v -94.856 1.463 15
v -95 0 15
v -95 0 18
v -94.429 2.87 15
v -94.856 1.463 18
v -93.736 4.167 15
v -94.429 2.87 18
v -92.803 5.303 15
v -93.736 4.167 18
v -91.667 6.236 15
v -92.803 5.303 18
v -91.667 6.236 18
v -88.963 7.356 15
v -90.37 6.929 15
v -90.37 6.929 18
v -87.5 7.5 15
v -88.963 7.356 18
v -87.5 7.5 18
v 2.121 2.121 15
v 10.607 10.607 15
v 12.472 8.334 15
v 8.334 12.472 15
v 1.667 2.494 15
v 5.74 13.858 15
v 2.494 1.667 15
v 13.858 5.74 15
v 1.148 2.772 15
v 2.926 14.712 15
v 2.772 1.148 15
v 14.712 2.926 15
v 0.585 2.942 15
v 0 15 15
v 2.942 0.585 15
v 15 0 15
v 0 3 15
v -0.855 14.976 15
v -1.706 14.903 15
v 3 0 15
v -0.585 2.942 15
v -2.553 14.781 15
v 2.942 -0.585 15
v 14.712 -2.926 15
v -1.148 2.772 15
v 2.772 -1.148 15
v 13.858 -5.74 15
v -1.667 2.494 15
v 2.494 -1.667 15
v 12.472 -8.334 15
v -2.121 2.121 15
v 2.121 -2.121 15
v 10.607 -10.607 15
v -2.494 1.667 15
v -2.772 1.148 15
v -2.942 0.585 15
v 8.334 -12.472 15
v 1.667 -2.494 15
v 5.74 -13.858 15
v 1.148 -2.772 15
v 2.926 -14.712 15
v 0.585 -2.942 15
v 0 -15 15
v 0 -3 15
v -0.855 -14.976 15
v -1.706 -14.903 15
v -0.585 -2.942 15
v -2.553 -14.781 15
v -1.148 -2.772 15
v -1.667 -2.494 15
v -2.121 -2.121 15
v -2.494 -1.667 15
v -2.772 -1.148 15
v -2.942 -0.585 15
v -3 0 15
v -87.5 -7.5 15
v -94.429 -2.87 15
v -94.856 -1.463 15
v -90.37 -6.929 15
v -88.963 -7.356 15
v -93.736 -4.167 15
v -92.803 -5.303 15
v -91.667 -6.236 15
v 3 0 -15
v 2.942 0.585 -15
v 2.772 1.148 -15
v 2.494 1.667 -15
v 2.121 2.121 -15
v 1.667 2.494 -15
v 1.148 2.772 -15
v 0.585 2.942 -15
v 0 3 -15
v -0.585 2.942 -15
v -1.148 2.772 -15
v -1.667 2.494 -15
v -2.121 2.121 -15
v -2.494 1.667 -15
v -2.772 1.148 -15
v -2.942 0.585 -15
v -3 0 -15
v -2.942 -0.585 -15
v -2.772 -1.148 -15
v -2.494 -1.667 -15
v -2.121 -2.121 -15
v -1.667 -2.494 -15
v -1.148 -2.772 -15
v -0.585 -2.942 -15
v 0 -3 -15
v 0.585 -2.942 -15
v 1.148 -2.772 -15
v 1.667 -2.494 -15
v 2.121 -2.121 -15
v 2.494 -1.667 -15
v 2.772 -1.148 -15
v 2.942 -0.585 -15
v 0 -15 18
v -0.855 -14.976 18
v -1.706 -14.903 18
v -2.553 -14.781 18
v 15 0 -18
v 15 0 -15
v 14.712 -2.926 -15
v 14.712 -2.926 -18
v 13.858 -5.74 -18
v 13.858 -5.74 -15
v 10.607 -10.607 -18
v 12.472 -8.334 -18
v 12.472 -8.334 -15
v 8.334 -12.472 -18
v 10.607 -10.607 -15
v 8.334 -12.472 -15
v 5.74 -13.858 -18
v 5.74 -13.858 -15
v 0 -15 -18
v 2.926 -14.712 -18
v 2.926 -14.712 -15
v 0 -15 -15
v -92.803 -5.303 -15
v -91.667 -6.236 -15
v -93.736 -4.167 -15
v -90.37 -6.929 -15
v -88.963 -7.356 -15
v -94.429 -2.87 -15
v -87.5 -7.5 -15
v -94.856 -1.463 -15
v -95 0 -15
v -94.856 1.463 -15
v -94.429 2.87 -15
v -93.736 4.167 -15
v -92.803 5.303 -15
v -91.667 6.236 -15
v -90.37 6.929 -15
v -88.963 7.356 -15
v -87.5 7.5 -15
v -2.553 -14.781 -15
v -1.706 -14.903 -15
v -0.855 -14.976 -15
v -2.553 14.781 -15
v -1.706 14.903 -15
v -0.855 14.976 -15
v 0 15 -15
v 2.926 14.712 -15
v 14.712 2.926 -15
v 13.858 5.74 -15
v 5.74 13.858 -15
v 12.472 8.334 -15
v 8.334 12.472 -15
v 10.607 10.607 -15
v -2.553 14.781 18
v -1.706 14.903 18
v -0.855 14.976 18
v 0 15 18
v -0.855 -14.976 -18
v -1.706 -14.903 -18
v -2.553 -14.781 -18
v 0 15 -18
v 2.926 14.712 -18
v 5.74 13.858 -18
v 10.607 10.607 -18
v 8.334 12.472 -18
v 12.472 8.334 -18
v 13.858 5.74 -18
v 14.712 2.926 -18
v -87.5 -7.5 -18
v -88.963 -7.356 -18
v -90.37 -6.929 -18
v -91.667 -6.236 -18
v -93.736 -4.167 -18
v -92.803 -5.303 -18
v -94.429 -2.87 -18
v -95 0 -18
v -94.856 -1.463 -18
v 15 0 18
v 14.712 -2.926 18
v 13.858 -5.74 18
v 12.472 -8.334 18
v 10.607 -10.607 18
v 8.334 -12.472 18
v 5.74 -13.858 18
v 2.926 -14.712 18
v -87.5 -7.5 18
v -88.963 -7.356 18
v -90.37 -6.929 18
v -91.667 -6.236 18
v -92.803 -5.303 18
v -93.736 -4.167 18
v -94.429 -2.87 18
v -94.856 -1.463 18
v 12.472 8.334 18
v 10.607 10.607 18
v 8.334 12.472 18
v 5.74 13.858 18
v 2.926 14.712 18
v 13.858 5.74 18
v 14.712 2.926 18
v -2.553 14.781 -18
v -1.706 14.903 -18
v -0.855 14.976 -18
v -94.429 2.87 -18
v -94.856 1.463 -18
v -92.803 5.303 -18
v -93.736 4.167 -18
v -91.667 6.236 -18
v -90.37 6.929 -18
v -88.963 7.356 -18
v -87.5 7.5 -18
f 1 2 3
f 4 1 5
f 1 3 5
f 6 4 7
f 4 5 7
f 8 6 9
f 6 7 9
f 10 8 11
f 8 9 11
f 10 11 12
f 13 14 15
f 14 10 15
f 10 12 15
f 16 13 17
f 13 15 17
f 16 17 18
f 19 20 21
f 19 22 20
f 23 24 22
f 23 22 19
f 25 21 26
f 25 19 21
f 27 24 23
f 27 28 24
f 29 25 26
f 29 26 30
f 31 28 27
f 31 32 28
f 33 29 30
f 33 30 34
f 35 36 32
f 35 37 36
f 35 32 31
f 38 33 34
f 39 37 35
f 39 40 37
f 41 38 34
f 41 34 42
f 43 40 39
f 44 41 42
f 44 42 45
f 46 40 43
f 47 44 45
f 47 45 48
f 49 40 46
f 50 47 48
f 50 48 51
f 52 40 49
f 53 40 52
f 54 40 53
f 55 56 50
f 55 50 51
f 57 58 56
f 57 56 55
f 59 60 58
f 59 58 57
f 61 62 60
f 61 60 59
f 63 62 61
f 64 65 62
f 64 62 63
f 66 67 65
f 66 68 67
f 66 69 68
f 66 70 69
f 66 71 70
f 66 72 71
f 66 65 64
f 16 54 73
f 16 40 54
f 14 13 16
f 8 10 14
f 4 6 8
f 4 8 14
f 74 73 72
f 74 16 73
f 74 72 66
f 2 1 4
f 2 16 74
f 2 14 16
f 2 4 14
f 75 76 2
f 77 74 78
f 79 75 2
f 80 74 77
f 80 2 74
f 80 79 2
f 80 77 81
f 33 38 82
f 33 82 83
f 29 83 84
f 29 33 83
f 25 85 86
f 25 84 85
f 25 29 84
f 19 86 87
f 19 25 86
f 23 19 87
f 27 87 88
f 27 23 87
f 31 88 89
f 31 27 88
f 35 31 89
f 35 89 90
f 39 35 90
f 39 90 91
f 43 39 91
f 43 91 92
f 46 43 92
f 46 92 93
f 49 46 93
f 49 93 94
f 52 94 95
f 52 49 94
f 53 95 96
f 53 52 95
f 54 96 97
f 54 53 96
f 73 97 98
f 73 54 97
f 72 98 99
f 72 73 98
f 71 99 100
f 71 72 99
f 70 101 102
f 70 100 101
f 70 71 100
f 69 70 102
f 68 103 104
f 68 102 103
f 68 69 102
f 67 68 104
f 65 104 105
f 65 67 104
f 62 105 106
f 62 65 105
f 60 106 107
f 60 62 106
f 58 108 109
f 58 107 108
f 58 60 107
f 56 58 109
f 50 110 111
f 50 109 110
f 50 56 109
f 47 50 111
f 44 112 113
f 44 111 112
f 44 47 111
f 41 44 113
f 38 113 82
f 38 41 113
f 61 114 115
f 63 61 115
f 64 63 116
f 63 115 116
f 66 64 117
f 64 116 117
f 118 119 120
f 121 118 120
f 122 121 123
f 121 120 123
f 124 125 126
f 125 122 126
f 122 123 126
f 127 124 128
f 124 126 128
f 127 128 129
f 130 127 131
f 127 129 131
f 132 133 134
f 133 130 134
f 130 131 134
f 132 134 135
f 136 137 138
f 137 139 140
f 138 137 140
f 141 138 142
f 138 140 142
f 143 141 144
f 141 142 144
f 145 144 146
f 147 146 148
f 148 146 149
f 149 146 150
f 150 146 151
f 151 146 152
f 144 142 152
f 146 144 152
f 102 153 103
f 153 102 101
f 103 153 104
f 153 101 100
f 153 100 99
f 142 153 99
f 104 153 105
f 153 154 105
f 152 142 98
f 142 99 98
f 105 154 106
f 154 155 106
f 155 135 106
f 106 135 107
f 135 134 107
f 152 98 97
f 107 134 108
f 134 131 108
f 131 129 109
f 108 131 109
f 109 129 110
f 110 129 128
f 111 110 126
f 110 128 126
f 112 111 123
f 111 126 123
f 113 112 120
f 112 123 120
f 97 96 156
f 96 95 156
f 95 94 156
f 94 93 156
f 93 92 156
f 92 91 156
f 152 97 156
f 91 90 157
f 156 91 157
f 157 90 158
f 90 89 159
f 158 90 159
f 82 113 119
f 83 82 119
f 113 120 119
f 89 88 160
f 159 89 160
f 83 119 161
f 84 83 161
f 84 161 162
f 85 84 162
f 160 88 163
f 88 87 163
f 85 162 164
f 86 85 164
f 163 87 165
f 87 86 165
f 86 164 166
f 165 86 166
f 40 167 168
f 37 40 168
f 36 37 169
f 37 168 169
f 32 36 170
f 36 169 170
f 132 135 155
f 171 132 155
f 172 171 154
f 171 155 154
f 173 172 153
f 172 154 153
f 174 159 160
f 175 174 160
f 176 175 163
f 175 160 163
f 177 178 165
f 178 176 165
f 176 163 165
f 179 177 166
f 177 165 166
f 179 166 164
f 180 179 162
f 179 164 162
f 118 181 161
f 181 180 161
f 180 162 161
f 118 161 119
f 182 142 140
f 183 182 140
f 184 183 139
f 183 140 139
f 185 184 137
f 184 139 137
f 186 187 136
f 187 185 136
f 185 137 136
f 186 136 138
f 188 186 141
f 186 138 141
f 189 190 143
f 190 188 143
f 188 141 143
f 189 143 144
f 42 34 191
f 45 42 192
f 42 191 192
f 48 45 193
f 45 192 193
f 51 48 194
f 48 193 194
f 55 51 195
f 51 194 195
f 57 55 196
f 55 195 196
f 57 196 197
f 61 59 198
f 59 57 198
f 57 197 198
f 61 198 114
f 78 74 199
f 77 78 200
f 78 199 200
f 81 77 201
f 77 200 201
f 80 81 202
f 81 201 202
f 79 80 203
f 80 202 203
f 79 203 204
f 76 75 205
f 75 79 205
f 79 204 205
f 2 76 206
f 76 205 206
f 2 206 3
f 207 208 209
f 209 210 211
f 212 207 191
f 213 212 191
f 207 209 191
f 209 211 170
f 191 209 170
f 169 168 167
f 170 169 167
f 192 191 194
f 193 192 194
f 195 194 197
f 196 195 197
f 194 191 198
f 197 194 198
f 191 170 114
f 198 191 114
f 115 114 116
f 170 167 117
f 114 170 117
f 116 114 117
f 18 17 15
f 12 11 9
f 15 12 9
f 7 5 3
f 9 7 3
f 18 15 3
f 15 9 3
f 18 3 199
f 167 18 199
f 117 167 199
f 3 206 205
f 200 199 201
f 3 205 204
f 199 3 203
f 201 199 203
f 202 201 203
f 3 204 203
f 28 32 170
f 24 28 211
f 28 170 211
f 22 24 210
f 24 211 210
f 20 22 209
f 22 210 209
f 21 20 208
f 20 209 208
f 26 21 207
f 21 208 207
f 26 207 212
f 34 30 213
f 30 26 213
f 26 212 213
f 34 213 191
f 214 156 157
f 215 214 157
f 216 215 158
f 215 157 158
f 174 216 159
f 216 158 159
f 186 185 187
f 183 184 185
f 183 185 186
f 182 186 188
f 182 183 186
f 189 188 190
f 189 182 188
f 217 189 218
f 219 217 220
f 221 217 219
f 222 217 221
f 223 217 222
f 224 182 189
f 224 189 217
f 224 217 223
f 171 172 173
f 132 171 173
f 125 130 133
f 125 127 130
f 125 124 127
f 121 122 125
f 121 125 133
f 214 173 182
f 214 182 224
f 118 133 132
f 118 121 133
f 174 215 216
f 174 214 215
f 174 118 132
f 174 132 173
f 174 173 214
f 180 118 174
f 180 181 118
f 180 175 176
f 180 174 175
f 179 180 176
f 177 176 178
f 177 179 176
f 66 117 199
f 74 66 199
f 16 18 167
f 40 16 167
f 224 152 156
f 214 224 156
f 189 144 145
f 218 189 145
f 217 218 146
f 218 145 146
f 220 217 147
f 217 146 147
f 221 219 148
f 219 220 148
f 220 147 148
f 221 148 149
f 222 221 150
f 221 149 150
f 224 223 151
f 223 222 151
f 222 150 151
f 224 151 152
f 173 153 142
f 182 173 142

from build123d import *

# Parameters (mm, degrees)
CROQUIS1_R              = 3
SALIENTE_EXTRUIR1_DEPTH = 18
CROQUIS2_R              = 3
SALIENTE_EXTRUIR2_DEPTH = 18
SALIENTE_EXTRUIR3_DEPTH = 15
CROQUIS4_W              = 3
CROQUIS4_H              = 30
SALIENTE_EXTRUIR4_DEPTH = 95
CORTAR_EXTRUIR1_DEPTH   = 95


with BuildPart() as part:
    # Croquis1 → Saliente-Extruir1 (new body)
    with BuildSketch(Plane.XY):
        Circle(CROQUIS1_R)
    extrude(amount=SALIENTE_EXTRUIR1_DEPTH)

    # Croquis2 → Saliente-Extruir2 (add)
    with BuildSketch(Plane.XY):
        Circle(CROQUIS2_R)
    extrude(amount=-SALIENTE_EXTRUIR2_DEPTH)

    # Croquis3 → Saliente-Extruir3 (add)
    with BuildSketch(Plane(origin=(0, 0, 0), x_dir=(0, 0, -1), z_dir=(1, 0, 0))):
        Polygon((-18, -15), (-18, 0), (-18, 15), (-15, 15), (-15, -15), align=None)
        Polygon((18, 0), (18, 15), (15, 15), (15, -15), (18, -15), align=None)
    extrude(amount=SALIENTE_EXTRUIR3_DEPTH)

    # Croquis4 → Saliente-Extruir4 (add)
    with BuildSketch(Plane(origin=(0, 0, 0), x_dir=(0, 0, -1), z_dir=(1, 0, 0))):
        with Locations((16.5, 0)):
            Rectangle(CROQUIS4_W, CROQUIS4_H)
        with Locations((-16.5, 0)):
            Rectangle(CROQUIS4_W, CROQUIS4_H)
    extrude(amount=-SALIENTE_EXTRUIR4_DEPTH)

    # Croquis5 → Cortar-Extruir1 (cut)
    with BuildSketch(Plane.XY.offset(18)):
        with BuildLine():
            ThreePointArc((-95, 0), (-92.803300859, 5.303300859), (-87.5, 7.5))
            Line((-87.5, 7.5), (-2.55267423, 14.781199352))
            ThreePointArc((-2.55267423, 14.781199352), (-1.28101712, 14.945199736), (0, 15))
            Line((0, 15), (-95, 15))
            Line((-95, 15), (-95, 0))
        make_face()
        with BuildLine():
            ThreePointArc((-87.5, -7.5), (-92.803300859, -5.303300859), (-95, 0))
            Line((-95, 0), (-95, -15))
            Line((-95, -15), (0, -15))
            ThreePointArc((0, -15), (-1.28101712, -14.945199736), (-2.55267423, -14.781199352))
            Line((-2.55267423, -14.781199352), (-87.5, -7.5))
        make_face()
        with BuildLine():
            Line((15, -15), (15, 0))
            ThreePointArc((15, 0), (10.606601718, -10.606601718), (0, -15))
            Line((0, -15), (15, -15))
        make_face()
        with BuildLine():
            Line((15, 15), (0, 15))
            ThreePointArc((0, 15), (10.606601718, 10.606601718), (15, 0))
            Line((15, 0), (15, 15))
        make_face()
    extrude(amount=-CORTAR_EXTRUIR1_DEPTH, mode=Mode.SUBTRACT)


solid = part.part
